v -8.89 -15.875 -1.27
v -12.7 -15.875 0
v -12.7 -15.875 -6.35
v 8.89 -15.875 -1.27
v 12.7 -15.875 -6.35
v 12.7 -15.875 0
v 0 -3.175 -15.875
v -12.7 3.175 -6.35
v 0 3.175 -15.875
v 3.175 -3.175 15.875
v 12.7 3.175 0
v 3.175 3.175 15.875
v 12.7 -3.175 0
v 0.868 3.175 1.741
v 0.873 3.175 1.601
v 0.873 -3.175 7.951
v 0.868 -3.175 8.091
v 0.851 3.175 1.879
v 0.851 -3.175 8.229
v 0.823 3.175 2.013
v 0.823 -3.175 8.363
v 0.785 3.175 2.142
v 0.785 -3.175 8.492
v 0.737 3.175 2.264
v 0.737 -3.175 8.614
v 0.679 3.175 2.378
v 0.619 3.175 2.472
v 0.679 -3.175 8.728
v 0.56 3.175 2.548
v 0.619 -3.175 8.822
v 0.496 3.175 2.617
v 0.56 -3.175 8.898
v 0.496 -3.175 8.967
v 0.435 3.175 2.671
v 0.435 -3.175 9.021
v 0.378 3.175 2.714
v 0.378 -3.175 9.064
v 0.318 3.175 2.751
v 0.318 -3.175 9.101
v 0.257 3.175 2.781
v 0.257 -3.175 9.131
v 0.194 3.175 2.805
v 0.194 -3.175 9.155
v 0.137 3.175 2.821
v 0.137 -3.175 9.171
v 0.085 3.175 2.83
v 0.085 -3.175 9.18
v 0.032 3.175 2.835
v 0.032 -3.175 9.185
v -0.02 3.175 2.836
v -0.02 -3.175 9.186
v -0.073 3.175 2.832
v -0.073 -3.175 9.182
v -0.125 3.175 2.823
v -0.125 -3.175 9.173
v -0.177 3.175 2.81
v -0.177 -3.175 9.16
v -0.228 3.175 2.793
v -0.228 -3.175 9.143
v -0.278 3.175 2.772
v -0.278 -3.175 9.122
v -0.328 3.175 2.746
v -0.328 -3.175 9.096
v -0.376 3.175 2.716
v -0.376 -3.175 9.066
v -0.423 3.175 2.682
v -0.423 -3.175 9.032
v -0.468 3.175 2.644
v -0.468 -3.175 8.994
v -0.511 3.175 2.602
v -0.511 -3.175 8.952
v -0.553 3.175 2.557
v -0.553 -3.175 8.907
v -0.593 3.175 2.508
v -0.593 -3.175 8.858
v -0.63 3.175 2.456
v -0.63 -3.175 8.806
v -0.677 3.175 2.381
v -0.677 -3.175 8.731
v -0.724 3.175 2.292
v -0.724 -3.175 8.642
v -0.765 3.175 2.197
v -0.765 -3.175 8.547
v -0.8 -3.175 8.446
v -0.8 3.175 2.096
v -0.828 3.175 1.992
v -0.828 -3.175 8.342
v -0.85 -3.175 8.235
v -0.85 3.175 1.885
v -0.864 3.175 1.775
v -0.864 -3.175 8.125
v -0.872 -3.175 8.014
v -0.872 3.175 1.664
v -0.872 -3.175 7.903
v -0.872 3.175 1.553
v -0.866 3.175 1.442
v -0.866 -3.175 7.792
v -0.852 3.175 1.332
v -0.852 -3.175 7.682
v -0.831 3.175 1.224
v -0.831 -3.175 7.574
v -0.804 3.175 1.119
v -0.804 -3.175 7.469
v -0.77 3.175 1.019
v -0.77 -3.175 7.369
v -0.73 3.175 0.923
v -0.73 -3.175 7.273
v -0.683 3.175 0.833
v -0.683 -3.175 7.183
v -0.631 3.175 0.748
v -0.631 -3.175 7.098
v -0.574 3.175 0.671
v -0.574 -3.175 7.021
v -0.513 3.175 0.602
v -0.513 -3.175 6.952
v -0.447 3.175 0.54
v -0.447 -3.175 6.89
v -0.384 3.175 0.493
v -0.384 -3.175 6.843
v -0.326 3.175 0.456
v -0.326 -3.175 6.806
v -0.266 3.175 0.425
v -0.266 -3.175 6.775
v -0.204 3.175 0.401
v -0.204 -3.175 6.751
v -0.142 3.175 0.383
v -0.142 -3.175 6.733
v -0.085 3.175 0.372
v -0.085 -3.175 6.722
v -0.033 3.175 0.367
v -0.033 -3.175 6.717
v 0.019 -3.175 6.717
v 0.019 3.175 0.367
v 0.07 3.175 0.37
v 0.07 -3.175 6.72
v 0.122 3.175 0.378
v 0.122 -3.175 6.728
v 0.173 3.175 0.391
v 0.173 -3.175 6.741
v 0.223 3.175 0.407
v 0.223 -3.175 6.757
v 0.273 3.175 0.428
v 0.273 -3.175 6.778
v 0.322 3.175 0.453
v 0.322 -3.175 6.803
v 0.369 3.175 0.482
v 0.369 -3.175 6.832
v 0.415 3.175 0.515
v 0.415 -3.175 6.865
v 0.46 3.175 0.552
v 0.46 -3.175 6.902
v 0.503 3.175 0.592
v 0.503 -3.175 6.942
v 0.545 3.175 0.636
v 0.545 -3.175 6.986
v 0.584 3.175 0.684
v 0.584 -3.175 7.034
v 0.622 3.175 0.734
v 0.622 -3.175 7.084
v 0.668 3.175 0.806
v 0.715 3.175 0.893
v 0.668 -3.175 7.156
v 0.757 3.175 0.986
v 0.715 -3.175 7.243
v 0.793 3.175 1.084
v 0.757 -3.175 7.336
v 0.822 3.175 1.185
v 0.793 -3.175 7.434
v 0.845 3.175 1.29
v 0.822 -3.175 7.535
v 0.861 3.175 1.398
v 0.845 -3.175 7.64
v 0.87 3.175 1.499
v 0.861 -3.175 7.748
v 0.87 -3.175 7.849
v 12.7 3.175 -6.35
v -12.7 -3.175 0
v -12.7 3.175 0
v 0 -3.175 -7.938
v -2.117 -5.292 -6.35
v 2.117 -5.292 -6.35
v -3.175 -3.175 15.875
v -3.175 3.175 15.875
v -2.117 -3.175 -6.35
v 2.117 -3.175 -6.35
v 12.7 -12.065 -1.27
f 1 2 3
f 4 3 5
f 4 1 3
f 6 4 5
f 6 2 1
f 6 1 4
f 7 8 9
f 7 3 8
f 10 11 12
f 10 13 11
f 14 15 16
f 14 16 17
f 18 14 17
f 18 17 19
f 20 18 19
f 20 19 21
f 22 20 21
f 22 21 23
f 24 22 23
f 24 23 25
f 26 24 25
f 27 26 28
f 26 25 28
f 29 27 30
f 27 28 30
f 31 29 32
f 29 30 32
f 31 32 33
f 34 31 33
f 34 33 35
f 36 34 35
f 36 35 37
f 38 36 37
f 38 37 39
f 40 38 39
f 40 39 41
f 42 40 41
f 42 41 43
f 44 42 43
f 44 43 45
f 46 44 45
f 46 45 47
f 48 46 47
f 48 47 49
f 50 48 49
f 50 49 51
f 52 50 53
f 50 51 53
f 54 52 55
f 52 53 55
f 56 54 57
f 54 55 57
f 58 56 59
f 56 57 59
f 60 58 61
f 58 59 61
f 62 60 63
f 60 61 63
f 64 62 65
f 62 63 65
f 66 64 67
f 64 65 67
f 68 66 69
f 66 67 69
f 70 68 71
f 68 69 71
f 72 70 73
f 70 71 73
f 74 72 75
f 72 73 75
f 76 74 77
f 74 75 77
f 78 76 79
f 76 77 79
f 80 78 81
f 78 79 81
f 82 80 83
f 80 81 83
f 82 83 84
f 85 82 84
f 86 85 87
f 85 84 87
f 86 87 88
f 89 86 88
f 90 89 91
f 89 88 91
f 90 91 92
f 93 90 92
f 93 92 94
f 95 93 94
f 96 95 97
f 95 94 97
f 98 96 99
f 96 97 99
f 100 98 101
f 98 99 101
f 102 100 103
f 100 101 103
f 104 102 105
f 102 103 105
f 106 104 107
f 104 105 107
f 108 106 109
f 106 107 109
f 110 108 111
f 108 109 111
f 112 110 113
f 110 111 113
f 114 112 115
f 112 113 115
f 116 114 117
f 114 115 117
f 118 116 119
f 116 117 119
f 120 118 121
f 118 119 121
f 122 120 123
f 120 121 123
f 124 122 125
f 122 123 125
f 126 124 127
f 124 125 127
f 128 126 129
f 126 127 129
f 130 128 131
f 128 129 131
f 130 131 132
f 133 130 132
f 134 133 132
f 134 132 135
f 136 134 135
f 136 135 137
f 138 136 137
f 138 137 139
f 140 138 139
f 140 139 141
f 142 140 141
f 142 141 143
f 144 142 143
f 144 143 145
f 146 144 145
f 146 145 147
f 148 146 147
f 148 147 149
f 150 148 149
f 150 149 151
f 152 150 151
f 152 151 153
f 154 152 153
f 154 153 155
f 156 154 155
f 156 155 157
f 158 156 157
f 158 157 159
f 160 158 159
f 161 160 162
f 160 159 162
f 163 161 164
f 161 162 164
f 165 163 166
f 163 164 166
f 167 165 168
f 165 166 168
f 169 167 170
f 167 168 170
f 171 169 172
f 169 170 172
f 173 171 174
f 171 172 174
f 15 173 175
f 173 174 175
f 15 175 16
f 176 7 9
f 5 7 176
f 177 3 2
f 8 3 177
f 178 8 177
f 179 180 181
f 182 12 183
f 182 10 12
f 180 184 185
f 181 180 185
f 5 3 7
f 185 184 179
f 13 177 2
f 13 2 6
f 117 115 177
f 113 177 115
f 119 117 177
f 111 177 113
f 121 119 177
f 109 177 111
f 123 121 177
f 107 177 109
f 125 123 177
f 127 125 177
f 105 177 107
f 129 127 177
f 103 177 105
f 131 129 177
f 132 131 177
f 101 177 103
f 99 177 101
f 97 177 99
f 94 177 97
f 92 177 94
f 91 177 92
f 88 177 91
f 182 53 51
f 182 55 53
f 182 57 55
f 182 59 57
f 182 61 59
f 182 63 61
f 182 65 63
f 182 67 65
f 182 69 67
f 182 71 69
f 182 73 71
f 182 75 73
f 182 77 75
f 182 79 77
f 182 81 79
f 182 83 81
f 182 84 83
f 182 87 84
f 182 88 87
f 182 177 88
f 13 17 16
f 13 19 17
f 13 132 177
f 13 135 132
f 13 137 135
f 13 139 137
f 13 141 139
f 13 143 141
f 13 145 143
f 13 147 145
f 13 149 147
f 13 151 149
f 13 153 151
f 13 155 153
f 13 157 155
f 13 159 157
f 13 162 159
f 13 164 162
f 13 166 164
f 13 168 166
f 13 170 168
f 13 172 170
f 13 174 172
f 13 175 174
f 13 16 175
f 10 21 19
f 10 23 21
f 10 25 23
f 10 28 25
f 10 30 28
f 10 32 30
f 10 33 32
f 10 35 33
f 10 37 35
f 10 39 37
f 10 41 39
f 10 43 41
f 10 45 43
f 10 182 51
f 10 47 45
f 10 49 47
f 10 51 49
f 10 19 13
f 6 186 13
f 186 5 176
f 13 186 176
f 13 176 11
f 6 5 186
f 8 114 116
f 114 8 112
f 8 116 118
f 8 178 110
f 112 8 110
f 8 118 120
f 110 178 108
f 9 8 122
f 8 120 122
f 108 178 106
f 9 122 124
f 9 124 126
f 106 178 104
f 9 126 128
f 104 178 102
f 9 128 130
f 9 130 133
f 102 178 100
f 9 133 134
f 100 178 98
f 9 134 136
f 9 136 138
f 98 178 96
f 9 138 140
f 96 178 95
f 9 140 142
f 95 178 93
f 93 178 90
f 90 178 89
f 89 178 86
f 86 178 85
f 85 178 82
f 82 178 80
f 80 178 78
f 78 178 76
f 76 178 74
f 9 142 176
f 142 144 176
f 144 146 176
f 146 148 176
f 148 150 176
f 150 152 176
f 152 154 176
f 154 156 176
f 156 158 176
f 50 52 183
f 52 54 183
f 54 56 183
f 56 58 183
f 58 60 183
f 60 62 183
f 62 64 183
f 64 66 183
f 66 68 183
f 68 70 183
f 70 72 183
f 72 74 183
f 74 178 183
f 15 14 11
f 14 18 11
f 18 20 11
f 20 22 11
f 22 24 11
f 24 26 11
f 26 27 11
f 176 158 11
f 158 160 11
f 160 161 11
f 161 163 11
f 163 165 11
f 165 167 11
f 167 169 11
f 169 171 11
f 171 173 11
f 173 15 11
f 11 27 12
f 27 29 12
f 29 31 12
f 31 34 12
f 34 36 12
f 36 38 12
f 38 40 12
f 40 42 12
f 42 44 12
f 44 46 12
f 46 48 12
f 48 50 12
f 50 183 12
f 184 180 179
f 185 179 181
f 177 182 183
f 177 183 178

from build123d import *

# Parameters (mm, degrees)
F1_DEPTH  = 3.175
F2_W      = 25.4
F2_H      = 6.35
F3_DEPTH  = 12.7
F5_DEPTH  = 6.35
F7_DEPTH  = 6.35
F10_DEPTH = 6.35
F13_R     = 0.873125
F14_DEPTH = 25.4


with BuildPart() as f1:
    # F0 (on Front) → F1 (new body, symmetric)
    with BuildSketch(Plane.XZ):
        Polygon((3.175, 15.875), (0, 15.875), (-3.175, 15.875), (-12.7, 0), (12.7, 0), align=None)
        Polygon((12.7, -6.35), (12.7, 0), (-12.7, 0), (-12.7, -6.35), (0, -6.35), align=None)
        Polygon((0, -15.875), (12.7, -6.35), (0, -6.35), align=None)
        Polygon((0, -6.35), (-12.7, -6.35), (0, -15.875), align=None)
    extrude(amount=F1_DEPTH, both=True)

    # F2 (on face) → F3 (join)
    with BuildSketch(Plane.XZ.offset(3.175)):
        with Locations((0, -3.175)):
            Rectangle(F2_W, F2_H)
    extrude(amount=F3_DEPTH)

    # F4 (on face) → F5 (join)
    with BuildSketch(Plane(origin=(7.62, 0, -10.16), x_dir=(0.8, 0, 0.6), z_dir=(0.6, 0, -0.8))):
        Polygon((-9.525, 3.175), (6.35, 3.175), (6.35, 15.875), align=None)
    extrude(amount=-F5_DEPTH)

    # F6 (on face) → F7 (join)
    with BuildSketch(Plane(origin=(-7.62, 0, -10.16), x_dir=(0.8, 0, -0.6), z_dir=(-0.6, 0, -0.8))):
        Polygon((-6.35, 15.875), (-6.35, 3.175), (9.525, 3.175), align=None)
    extrude(amount=-F7_DEPTH)

    # F9 (on 3pt) → F10 (join)
    with BuildSketch(Plane(origin=(0, -8.763, -11.684), x_dir=(1, 0, 0), z_dir=(0, -0.6, -0.8))):
        Polygon((0, -6.9850953296), (12.700131163, 8.8898520917), (-12.699984014, 8.8898520917), align=None)
    extrude(amount=-F10_DEPTH)

    # F13 (on 3pt) → F14 (cut)
    with BuildSketch(Plane(origin=(0, -9.525, 9.525), x_dir=(1, 0, 0), z_dir=(0, -0.7071067812, 0.7071067812))):
        with Locations((0, 3.3772722036)):
            Circle(F13_R)
    extrude(amount=-F14_DEPTH, mode=Mode.SUBTRACT)


solid = f1.part
